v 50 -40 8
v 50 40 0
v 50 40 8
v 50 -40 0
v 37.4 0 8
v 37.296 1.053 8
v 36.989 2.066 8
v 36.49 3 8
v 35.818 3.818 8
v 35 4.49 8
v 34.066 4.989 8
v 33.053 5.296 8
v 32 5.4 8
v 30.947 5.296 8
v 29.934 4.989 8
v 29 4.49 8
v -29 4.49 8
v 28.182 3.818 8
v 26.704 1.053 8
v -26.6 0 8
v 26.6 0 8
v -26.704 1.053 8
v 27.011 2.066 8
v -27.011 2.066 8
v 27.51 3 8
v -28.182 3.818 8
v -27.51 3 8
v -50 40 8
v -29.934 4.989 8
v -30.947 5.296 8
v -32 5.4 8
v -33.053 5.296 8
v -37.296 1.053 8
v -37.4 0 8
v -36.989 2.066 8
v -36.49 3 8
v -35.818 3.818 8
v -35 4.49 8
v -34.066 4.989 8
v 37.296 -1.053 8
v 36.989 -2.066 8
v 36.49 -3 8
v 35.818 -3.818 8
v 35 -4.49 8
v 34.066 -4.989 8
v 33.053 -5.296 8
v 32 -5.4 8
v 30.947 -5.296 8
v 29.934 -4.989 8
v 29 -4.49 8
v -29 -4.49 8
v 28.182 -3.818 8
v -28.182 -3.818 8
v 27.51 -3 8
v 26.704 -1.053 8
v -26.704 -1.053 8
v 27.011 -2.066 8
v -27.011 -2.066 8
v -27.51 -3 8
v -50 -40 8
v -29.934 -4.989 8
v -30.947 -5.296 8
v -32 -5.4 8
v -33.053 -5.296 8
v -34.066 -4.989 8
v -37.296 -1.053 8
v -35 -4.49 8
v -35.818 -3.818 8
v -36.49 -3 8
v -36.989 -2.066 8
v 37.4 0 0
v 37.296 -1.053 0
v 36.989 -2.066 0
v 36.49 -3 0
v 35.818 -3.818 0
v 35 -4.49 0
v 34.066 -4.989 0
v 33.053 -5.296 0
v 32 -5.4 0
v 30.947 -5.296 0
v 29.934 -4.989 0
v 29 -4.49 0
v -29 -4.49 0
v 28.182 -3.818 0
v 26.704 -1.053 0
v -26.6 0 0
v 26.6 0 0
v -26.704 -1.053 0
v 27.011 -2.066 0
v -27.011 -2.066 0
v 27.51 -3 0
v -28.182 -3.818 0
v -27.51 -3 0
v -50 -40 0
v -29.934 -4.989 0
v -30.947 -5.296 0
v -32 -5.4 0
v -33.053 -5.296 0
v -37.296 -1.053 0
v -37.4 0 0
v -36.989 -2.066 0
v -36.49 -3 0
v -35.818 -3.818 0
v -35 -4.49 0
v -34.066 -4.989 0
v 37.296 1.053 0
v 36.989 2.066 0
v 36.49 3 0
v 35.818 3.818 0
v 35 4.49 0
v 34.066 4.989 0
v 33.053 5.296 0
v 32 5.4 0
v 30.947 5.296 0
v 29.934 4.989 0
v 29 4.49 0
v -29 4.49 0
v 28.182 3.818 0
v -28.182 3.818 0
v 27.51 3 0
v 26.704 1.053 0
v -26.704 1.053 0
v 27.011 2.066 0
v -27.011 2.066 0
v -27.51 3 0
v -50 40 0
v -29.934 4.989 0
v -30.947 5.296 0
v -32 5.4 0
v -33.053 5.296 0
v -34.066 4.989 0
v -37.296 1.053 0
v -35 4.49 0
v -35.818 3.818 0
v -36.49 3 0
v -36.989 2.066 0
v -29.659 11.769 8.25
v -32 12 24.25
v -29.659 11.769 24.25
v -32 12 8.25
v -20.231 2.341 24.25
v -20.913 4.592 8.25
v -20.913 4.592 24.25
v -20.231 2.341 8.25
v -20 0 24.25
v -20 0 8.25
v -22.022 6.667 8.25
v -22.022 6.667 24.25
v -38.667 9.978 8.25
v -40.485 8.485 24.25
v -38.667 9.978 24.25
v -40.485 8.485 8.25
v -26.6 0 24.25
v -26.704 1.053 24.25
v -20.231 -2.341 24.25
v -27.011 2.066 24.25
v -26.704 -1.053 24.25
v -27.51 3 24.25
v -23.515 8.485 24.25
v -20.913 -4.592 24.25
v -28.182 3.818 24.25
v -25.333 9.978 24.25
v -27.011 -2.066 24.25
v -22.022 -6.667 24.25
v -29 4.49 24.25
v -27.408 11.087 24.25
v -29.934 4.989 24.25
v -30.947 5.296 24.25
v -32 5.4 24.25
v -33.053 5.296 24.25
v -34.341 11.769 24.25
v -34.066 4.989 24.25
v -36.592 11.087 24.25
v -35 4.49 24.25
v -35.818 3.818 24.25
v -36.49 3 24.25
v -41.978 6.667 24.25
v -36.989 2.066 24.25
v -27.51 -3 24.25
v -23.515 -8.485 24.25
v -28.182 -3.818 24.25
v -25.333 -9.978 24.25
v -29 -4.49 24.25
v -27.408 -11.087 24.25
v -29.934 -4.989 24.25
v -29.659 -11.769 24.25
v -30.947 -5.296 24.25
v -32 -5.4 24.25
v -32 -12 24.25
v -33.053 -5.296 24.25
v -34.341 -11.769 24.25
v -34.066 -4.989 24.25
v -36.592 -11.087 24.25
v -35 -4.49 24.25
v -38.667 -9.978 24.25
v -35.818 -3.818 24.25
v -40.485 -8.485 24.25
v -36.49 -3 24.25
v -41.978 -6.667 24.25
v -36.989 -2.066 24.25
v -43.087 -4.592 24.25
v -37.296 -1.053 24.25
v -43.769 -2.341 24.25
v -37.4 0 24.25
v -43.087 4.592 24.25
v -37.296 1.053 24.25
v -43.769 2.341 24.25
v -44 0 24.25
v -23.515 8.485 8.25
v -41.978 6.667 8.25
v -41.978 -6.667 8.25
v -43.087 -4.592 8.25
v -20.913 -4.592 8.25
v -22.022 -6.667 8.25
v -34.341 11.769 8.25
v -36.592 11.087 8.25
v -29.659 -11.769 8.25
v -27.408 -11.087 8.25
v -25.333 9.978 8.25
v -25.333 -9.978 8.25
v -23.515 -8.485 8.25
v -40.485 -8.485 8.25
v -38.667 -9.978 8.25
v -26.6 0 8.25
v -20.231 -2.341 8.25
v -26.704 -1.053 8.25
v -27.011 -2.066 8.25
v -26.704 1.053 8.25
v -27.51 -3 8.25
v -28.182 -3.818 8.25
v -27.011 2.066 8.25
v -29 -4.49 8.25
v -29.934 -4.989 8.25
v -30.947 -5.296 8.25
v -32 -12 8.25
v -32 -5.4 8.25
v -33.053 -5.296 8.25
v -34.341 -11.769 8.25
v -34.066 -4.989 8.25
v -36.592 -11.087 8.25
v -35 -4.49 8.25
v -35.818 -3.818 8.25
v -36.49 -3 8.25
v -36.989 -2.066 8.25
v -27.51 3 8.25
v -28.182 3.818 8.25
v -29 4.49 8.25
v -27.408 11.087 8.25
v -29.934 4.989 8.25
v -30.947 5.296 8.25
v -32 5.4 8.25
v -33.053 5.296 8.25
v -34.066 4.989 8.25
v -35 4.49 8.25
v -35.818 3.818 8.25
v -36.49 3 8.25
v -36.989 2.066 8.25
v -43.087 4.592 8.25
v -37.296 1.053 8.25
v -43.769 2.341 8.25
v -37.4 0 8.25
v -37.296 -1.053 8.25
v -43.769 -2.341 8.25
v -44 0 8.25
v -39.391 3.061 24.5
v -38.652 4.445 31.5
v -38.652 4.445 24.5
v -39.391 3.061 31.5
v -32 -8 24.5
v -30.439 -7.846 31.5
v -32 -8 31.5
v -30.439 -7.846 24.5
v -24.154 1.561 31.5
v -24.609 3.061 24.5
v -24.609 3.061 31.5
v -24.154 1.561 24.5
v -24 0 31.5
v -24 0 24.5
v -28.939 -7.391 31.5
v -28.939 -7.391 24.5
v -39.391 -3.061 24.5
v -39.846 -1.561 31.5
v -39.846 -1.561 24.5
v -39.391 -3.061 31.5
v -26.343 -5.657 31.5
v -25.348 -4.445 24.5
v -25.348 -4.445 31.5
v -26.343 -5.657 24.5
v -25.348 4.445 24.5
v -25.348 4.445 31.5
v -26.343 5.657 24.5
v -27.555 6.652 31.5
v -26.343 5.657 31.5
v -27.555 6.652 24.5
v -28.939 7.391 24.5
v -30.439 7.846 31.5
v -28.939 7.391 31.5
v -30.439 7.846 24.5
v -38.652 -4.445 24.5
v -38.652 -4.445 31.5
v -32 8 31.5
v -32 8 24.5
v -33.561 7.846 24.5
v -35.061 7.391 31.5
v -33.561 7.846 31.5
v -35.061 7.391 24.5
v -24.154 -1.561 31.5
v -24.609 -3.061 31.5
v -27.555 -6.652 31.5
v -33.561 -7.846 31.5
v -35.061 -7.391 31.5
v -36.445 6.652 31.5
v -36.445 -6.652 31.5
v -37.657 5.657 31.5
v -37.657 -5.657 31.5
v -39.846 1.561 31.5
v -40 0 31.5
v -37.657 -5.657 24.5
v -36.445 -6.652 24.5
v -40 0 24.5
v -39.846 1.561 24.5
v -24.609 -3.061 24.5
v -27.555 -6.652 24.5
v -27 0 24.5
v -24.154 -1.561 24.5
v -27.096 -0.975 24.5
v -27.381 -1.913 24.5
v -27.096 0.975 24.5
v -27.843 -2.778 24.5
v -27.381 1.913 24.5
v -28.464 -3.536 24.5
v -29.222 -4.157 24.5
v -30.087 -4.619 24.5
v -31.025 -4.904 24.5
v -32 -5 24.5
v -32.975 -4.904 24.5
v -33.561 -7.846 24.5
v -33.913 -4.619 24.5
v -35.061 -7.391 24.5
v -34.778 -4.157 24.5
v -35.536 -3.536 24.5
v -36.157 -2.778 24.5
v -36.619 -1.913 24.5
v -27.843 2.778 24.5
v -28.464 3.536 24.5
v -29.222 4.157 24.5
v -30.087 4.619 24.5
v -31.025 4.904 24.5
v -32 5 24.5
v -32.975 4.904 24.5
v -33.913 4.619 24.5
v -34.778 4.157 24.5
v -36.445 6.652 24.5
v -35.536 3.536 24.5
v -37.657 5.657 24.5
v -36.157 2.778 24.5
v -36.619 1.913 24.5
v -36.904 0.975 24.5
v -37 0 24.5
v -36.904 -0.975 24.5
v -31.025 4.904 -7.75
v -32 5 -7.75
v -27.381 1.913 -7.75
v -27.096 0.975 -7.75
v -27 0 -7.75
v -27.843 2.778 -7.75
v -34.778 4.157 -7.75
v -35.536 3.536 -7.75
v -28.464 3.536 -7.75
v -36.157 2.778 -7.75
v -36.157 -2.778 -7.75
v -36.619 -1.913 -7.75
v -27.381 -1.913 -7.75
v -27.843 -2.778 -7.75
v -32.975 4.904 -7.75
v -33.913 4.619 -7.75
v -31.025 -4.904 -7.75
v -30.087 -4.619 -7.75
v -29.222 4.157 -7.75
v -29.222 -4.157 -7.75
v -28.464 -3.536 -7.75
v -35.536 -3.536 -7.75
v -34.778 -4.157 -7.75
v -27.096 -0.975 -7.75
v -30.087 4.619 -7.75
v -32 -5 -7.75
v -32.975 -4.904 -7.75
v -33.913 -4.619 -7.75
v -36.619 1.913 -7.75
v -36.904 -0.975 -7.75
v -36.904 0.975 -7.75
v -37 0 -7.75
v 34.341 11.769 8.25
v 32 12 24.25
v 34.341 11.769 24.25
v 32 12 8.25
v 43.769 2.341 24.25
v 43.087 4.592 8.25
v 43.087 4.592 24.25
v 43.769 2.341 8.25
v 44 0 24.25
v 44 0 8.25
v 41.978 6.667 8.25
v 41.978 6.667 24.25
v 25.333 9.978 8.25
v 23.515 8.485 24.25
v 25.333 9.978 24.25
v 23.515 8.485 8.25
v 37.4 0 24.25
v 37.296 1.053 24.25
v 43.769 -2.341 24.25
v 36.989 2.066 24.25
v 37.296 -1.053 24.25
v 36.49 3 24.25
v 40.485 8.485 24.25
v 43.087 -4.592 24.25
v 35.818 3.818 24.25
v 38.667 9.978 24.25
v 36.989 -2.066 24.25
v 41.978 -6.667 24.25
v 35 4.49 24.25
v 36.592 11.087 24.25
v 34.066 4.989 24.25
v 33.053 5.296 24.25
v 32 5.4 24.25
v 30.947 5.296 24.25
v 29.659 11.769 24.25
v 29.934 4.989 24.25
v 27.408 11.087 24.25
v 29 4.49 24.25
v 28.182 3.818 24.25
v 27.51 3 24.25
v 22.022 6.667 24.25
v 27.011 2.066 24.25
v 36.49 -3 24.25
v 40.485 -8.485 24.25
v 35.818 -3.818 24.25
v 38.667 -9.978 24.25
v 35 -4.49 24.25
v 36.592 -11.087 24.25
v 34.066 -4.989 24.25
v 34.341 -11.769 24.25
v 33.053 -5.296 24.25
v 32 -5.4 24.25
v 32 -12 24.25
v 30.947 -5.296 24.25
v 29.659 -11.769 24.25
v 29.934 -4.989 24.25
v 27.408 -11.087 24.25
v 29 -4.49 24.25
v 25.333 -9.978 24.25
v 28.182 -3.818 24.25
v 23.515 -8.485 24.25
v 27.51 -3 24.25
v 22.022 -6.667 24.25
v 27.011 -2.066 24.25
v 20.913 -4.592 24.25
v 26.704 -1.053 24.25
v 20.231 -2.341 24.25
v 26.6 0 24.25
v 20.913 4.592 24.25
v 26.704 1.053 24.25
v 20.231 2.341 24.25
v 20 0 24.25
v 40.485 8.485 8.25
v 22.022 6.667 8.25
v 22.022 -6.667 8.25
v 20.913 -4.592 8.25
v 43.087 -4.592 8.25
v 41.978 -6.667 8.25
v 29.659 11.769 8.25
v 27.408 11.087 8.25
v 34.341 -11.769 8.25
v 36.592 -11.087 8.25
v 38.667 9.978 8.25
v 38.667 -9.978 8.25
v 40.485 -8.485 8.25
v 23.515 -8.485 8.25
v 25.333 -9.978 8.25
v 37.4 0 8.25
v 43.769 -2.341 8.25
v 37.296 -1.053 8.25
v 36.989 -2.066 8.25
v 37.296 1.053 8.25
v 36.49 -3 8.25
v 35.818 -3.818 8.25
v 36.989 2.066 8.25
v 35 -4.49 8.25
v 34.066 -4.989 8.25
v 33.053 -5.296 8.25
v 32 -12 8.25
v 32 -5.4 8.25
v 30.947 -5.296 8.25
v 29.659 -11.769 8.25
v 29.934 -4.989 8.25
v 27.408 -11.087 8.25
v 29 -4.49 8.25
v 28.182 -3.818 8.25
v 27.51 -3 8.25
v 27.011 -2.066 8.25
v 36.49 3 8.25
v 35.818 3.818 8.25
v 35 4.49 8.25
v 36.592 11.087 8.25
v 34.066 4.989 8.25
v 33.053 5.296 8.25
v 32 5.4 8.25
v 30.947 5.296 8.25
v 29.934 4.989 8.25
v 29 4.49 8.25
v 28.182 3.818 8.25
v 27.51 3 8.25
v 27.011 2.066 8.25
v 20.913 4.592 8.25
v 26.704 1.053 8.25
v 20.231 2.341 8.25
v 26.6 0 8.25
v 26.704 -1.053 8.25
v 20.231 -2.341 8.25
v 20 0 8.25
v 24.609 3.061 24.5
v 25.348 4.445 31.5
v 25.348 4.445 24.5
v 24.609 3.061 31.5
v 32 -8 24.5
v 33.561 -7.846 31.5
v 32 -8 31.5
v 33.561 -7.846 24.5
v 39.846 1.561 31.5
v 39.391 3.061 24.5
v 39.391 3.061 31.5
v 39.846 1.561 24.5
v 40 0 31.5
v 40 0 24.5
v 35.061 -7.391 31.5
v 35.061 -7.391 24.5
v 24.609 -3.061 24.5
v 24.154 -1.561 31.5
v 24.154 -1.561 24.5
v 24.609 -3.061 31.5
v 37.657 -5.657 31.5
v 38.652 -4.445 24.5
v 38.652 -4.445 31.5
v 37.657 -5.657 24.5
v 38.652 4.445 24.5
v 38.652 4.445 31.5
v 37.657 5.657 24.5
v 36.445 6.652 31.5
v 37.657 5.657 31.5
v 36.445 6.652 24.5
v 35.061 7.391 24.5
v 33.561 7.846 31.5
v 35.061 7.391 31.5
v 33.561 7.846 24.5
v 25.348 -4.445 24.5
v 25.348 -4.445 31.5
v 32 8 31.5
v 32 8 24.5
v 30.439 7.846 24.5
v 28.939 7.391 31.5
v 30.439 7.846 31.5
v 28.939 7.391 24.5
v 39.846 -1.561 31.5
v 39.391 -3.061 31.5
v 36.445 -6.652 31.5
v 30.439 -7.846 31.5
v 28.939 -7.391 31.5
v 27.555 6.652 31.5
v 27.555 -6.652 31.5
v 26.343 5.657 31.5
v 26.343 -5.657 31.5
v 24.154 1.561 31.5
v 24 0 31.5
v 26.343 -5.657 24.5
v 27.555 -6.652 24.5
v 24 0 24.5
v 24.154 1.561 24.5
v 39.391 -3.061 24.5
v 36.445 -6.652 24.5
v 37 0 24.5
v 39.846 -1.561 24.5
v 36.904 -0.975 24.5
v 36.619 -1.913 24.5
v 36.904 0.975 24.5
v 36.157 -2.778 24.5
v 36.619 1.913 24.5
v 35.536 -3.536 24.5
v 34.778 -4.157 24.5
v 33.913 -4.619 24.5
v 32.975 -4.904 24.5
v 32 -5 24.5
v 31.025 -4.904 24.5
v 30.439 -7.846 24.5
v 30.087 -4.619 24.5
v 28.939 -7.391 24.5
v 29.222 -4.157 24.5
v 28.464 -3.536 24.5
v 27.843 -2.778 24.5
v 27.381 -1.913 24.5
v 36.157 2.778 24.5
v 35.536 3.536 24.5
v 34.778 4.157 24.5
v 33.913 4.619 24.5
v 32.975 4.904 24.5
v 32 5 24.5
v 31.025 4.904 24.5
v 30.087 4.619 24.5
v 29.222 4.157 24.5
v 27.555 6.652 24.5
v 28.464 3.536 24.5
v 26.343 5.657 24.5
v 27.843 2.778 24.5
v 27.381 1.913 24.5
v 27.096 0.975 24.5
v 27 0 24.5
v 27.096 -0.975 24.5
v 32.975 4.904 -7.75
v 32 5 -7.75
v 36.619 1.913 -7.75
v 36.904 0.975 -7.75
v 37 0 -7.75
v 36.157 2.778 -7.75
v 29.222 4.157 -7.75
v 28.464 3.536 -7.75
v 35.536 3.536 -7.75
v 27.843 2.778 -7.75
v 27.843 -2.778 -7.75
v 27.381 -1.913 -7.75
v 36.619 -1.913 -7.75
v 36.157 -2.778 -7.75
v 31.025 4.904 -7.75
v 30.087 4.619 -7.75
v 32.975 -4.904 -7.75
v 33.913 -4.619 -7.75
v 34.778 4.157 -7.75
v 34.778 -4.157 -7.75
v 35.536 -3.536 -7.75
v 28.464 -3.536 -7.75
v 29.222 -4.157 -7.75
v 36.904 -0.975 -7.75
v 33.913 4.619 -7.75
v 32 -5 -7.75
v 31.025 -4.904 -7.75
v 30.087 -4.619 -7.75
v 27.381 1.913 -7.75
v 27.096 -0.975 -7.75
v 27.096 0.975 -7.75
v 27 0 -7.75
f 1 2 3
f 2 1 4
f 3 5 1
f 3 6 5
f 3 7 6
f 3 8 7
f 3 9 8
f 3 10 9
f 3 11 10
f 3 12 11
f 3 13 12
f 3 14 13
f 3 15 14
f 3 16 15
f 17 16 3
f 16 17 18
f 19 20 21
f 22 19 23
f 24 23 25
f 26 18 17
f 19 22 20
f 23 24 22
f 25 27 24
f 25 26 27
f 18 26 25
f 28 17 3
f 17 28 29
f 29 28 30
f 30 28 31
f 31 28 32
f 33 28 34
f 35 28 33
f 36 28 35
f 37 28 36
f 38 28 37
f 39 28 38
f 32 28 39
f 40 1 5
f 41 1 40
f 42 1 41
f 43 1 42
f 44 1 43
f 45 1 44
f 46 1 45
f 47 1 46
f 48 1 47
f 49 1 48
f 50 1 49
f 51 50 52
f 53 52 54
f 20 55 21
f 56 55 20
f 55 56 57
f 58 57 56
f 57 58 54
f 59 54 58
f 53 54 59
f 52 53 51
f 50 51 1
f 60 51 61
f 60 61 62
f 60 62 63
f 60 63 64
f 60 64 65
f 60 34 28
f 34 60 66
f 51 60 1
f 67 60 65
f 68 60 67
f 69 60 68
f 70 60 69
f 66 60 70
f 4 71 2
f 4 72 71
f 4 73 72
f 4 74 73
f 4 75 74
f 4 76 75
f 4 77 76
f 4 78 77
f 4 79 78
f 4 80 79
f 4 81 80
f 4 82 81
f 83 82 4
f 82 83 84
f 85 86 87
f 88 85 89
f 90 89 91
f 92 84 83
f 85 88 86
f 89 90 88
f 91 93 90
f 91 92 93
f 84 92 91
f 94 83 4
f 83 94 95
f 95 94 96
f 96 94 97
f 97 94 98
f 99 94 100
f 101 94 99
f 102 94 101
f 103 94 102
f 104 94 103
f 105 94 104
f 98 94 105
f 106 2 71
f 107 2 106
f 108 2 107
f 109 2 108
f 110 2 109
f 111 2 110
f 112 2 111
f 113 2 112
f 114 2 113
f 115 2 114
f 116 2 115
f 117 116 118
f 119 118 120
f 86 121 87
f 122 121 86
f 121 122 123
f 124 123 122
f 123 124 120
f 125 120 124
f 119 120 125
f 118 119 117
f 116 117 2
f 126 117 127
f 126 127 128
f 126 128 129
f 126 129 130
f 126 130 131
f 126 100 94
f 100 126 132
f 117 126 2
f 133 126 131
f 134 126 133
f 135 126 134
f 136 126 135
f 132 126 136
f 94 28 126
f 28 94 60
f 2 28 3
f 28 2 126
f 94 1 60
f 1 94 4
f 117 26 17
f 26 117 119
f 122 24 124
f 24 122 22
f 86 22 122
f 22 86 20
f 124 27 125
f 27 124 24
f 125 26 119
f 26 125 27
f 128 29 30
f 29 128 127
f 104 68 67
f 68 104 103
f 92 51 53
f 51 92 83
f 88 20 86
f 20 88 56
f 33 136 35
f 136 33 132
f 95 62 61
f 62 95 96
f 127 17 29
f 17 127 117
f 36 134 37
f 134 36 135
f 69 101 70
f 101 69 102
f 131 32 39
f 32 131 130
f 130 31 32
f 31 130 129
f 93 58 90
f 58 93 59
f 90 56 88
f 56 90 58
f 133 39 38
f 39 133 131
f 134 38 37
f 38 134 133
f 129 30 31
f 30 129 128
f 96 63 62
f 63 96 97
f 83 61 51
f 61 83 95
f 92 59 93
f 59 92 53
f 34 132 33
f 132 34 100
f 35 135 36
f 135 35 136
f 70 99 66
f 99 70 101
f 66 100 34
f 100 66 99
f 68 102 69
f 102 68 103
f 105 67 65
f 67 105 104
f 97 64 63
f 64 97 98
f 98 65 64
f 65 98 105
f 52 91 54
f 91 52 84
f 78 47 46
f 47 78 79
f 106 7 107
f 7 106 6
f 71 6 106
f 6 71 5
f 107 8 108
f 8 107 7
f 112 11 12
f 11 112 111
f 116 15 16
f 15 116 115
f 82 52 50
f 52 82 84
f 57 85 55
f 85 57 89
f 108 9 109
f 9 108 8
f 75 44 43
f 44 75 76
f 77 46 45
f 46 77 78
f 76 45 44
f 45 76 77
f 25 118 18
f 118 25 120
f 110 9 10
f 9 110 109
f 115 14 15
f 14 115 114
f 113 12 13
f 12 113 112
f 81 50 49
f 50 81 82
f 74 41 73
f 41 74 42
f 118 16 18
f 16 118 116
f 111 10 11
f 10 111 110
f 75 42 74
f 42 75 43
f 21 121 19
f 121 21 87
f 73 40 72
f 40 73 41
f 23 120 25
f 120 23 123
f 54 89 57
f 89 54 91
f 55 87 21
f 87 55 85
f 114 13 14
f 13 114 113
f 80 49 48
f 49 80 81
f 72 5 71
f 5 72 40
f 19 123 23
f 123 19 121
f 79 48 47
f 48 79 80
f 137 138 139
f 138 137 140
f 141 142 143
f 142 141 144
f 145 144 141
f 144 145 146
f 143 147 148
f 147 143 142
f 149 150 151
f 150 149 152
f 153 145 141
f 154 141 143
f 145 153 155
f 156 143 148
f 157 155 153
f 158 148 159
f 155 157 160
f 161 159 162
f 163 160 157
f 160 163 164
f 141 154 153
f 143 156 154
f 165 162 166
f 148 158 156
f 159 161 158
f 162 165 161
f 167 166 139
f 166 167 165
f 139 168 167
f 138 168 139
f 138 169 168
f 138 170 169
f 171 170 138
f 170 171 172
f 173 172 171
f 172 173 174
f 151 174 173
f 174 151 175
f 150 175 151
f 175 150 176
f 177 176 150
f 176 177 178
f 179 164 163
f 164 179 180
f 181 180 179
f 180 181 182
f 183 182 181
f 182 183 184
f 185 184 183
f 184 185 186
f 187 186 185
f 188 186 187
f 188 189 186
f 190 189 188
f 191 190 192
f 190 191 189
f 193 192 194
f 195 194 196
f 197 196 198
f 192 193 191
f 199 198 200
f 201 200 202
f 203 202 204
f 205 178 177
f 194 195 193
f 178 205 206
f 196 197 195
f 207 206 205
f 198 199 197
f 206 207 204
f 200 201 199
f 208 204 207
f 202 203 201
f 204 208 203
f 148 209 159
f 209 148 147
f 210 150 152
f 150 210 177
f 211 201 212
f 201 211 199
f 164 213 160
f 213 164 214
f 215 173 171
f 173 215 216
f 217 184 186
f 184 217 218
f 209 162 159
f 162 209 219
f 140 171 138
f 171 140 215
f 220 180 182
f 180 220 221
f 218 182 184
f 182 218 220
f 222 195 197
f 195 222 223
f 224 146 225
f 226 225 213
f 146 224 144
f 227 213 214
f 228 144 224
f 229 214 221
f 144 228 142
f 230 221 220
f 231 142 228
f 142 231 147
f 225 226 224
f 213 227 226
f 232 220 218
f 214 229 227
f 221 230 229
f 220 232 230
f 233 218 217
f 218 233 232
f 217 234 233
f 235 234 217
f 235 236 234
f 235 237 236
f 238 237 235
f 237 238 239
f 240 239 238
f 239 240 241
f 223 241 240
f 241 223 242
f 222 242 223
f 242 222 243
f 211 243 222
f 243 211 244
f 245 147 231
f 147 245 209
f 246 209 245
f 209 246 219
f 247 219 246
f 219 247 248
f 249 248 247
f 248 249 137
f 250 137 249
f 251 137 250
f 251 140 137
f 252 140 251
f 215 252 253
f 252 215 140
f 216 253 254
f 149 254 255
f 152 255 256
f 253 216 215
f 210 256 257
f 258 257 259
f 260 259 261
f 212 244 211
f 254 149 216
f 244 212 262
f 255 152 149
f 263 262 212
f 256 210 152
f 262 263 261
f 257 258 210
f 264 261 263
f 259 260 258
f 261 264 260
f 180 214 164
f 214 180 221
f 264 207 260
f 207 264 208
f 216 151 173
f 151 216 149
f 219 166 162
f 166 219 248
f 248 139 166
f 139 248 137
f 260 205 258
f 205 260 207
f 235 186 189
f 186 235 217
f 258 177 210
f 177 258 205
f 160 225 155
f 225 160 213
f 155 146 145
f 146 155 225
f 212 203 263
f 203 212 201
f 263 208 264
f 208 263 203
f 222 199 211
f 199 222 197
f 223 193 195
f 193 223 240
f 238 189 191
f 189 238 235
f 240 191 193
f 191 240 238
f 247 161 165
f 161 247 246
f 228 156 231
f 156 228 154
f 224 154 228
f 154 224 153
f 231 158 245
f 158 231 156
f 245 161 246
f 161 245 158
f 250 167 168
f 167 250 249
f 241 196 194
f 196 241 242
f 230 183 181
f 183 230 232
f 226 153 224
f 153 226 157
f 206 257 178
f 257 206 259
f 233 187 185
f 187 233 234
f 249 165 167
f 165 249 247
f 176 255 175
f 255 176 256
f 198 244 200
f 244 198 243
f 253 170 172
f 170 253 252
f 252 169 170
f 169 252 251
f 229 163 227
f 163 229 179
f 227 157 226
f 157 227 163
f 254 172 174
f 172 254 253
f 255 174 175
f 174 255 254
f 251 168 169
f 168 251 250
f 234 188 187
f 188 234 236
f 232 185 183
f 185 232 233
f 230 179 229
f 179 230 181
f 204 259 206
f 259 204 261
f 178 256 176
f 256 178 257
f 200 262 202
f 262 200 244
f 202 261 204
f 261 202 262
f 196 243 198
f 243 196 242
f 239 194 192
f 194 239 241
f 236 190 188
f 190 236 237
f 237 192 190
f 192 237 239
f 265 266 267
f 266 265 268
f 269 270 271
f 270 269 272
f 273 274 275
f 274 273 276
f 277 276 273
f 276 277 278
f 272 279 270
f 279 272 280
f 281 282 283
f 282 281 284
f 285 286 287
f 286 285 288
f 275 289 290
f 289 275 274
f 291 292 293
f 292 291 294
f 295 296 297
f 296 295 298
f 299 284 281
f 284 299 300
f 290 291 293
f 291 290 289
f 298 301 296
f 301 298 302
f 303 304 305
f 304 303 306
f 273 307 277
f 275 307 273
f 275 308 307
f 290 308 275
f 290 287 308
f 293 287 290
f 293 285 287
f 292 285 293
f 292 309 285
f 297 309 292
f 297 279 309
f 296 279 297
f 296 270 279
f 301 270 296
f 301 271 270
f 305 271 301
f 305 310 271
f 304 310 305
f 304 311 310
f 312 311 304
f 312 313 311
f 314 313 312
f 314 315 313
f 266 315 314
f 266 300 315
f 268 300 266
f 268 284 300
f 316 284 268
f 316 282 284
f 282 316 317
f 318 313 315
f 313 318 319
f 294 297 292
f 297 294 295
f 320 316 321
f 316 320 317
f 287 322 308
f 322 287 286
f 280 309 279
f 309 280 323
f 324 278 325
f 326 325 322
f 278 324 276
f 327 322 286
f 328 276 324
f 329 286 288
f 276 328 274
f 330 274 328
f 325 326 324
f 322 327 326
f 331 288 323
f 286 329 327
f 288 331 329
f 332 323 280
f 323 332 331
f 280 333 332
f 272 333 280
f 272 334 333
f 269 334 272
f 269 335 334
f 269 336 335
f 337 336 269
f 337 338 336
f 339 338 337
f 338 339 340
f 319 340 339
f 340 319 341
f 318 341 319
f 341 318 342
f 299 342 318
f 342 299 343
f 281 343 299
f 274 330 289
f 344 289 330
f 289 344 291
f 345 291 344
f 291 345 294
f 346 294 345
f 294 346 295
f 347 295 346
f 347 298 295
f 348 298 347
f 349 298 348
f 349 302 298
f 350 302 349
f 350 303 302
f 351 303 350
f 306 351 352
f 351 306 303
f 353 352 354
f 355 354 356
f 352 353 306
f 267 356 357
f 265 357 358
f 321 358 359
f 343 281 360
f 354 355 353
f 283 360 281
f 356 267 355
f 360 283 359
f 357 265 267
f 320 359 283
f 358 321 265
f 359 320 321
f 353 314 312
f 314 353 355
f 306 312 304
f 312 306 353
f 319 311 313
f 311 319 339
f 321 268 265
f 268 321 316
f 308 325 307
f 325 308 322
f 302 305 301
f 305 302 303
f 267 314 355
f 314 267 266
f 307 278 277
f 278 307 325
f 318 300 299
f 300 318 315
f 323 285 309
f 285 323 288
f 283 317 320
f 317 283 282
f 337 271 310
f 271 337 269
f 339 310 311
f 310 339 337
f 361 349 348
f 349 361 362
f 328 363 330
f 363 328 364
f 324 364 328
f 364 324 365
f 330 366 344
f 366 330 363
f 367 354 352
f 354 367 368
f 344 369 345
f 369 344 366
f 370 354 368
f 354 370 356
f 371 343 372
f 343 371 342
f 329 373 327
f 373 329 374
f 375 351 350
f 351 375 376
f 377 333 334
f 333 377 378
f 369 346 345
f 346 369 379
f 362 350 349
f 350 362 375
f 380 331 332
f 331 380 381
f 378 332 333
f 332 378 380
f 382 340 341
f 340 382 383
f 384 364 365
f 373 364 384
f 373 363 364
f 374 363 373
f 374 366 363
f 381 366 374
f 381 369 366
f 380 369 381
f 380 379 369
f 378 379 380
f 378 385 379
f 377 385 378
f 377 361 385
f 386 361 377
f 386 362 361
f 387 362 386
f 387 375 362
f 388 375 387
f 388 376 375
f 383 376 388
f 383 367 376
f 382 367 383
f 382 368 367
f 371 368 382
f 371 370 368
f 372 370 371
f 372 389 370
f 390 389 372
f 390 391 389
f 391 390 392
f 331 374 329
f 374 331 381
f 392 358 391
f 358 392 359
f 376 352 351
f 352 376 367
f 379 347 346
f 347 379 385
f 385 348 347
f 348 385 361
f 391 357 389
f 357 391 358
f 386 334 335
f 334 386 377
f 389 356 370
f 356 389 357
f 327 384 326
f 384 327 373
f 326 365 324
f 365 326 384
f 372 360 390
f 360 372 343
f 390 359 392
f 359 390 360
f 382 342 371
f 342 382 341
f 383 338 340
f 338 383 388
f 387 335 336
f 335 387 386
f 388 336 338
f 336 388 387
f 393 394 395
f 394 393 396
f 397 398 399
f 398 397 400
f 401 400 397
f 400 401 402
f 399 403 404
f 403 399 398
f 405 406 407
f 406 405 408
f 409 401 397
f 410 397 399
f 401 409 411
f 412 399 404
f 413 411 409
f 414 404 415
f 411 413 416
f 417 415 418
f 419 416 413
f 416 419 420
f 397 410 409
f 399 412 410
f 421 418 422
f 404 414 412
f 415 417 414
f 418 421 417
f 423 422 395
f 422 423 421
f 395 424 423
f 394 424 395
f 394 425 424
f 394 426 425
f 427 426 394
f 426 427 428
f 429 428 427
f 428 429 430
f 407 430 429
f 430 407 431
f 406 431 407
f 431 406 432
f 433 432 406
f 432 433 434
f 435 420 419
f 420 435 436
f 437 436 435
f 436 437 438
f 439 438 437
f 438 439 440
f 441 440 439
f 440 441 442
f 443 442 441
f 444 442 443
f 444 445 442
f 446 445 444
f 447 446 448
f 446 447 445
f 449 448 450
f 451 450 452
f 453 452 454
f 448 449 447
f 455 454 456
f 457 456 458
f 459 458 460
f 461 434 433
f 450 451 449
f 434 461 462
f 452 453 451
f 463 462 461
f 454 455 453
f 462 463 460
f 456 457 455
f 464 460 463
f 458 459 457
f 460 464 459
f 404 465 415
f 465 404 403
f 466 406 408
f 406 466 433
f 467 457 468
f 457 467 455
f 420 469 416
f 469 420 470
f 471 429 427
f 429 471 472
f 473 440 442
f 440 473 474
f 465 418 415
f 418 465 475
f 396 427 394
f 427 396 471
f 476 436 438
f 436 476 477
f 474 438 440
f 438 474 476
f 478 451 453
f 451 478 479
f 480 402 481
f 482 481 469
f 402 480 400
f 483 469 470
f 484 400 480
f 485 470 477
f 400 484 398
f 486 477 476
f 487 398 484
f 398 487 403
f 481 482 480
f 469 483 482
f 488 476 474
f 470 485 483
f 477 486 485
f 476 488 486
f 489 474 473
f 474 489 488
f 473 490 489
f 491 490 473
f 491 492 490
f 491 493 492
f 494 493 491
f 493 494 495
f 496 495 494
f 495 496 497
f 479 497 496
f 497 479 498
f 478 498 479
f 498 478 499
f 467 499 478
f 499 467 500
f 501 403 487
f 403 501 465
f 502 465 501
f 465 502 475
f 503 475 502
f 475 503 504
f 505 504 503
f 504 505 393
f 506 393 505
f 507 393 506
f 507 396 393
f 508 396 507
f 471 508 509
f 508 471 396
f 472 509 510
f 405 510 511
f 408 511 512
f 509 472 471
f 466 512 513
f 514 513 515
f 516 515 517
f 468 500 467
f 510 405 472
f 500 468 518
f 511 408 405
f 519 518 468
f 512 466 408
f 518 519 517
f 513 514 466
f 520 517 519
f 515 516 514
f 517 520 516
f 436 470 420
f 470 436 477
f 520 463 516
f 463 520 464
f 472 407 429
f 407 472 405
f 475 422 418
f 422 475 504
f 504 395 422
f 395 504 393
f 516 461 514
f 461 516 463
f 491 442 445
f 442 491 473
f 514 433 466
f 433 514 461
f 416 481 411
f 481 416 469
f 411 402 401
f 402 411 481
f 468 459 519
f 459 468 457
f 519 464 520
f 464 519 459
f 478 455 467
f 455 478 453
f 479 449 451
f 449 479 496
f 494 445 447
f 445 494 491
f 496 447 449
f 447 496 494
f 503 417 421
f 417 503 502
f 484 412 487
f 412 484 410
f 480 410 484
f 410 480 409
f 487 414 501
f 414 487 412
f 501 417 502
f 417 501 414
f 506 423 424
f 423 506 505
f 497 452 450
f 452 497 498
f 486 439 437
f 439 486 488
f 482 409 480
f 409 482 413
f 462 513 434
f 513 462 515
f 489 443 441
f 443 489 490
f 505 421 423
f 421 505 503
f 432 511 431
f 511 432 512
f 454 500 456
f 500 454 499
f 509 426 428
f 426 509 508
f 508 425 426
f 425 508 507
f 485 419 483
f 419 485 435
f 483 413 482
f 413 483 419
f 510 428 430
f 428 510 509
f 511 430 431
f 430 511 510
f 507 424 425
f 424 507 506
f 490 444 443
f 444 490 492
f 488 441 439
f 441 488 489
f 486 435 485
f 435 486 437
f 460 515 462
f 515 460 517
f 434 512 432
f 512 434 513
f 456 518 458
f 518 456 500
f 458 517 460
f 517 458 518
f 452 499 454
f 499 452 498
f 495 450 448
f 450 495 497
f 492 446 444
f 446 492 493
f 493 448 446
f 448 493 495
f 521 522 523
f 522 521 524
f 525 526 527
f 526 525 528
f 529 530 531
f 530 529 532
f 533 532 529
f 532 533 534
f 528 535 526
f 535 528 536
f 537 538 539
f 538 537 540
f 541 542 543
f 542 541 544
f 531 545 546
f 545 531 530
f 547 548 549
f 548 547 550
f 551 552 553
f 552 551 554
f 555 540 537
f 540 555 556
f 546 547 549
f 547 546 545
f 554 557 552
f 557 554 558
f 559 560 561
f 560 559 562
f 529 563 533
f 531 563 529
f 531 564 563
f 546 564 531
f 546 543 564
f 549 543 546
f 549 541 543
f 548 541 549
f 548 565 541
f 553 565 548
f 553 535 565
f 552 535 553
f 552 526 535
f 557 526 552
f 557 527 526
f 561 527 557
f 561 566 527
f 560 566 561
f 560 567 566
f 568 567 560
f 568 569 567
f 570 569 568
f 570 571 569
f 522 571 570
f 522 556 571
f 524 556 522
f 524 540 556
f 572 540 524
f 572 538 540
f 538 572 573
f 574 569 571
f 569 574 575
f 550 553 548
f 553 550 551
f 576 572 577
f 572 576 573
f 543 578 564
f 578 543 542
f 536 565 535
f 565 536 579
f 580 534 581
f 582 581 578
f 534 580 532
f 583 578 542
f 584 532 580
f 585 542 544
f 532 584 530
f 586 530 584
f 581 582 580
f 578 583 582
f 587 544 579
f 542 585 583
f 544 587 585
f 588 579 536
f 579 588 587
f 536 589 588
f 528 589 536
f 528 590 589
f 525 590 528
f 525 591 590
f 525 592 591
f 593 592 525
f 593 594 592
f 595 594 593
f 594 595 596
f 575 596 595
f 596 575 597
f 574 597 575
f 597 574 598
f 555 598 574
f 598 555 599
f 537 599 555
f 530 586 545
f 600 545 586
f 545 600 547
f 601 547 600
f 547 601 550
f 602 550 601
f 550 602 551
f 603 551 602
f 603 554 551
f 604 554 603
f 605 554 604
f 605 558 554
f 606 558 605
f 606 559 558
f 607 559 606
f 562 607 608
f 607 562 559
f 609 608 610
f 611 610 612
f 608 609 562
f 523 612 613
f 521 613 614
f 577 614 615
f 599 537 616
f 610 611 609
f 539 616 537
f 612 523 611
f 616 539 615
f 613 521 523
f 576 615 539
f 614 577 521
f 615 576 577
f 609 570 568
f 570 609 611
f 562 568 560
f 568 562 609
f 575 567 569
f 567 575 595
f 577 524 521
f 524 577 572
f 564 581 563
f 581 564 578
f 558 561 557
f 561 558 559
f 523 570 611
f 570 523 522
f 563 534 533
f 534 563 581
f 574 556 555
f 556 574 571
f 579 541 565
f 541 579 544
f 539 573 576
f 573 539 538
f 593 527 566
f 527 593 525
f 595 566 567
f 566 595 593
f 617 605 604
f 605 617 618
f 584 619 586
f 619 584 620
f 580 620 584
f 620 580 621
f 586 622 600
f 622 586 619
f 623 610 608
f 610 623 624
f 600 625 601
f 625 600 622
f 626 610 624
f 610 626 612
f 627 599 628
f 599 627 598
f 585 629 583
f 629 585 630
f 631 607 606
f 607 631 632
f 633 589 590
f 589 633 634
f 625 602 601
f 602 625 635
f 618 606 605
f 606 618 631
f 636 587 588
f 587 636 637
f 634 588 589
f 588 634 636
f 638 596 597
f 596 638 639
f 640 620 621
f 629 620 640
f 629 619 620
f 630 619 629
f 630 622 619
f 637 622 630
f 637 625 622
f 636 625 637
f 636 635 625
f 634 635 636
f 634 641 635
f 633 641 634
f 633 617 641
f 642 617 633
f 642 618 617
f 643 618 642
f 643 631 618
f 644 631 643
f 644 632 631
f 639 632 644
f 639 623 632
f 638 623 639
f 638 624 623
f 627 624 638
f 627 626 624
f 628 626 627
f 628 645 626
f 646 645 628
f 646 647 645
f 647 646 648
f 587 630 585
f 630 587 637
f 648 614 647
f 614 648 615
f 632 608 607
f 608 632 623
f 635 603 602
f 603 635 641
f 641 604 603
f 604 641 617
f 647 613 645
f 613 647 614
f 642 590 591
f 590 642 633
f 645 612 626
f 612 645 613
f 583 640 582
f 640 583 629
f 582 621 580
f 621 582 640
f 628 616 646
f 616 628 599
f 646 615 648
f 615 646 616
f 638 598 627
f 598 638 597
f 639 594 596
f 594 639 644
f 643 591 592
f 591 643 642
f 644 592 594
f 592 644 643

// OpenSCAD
$fn = 32;

// ------------------------------------------------------------------------
// Standoff columns: 2 d24 standoffs, bolts d10
// Every part is its own module, assembly() places them once.
// ------------------------------------------------------------------------

// --- part 1 ---
module base_plate() {
  difference() {
    translate([-50, -40, 0]) cube([100, 80, 8]);
    translate([-32, 0, -1]) cylinder(h = 10, d = 10.8);
    translate([32, 0, -1]) cylinder(h = 10, d = 10.8);
  }
}

// --- part 2 ---
module spacer1() {
  difference() {
      translate([0, 0, 0]) cylinder(h = 16, d = 24);
      translate([0, 0, -1]) cylinder(h = 18, d = 10.8);
    }
}

// --- part 3 ---
module bolt1() {
  cylinder(h = 7, d = 16);
  translate([0, 0, -32.25]) cylinder(h = 32.25, d = 10);
}

// --- part 4 ---
module spacer2() {
  difference() {
      translate([0, 0, 0]) cylinder(h = 16, d = 24);
      translate([0, 0, -1]) cylinder(h = 18, d = 10.8);
    }
}

// --- part 5 ---
module bolt2() {
  cylinder(h = 7, d = 16);
  translate([0, 0, -32.25]) cylinder(h = 32.25, d = 10);
}

// --- assembly ---
module assembly() {
  translate([0, 0, 0]) rotate([0, 0, 0]) base_plate();
  translate([-32, 0, 8.25]) rotate([0, 0, 0]) spacer1();
  translate([-32, 0, 24.5]) rotate([0, 0, 0]) bolt1();
  translate([32, 0, 8.25]) rotate([0, 0, 0]) spacer2();
  translate([32, 0, 24.5]) rotate([0, 0, 0]) bolt2();
}

assembly();
